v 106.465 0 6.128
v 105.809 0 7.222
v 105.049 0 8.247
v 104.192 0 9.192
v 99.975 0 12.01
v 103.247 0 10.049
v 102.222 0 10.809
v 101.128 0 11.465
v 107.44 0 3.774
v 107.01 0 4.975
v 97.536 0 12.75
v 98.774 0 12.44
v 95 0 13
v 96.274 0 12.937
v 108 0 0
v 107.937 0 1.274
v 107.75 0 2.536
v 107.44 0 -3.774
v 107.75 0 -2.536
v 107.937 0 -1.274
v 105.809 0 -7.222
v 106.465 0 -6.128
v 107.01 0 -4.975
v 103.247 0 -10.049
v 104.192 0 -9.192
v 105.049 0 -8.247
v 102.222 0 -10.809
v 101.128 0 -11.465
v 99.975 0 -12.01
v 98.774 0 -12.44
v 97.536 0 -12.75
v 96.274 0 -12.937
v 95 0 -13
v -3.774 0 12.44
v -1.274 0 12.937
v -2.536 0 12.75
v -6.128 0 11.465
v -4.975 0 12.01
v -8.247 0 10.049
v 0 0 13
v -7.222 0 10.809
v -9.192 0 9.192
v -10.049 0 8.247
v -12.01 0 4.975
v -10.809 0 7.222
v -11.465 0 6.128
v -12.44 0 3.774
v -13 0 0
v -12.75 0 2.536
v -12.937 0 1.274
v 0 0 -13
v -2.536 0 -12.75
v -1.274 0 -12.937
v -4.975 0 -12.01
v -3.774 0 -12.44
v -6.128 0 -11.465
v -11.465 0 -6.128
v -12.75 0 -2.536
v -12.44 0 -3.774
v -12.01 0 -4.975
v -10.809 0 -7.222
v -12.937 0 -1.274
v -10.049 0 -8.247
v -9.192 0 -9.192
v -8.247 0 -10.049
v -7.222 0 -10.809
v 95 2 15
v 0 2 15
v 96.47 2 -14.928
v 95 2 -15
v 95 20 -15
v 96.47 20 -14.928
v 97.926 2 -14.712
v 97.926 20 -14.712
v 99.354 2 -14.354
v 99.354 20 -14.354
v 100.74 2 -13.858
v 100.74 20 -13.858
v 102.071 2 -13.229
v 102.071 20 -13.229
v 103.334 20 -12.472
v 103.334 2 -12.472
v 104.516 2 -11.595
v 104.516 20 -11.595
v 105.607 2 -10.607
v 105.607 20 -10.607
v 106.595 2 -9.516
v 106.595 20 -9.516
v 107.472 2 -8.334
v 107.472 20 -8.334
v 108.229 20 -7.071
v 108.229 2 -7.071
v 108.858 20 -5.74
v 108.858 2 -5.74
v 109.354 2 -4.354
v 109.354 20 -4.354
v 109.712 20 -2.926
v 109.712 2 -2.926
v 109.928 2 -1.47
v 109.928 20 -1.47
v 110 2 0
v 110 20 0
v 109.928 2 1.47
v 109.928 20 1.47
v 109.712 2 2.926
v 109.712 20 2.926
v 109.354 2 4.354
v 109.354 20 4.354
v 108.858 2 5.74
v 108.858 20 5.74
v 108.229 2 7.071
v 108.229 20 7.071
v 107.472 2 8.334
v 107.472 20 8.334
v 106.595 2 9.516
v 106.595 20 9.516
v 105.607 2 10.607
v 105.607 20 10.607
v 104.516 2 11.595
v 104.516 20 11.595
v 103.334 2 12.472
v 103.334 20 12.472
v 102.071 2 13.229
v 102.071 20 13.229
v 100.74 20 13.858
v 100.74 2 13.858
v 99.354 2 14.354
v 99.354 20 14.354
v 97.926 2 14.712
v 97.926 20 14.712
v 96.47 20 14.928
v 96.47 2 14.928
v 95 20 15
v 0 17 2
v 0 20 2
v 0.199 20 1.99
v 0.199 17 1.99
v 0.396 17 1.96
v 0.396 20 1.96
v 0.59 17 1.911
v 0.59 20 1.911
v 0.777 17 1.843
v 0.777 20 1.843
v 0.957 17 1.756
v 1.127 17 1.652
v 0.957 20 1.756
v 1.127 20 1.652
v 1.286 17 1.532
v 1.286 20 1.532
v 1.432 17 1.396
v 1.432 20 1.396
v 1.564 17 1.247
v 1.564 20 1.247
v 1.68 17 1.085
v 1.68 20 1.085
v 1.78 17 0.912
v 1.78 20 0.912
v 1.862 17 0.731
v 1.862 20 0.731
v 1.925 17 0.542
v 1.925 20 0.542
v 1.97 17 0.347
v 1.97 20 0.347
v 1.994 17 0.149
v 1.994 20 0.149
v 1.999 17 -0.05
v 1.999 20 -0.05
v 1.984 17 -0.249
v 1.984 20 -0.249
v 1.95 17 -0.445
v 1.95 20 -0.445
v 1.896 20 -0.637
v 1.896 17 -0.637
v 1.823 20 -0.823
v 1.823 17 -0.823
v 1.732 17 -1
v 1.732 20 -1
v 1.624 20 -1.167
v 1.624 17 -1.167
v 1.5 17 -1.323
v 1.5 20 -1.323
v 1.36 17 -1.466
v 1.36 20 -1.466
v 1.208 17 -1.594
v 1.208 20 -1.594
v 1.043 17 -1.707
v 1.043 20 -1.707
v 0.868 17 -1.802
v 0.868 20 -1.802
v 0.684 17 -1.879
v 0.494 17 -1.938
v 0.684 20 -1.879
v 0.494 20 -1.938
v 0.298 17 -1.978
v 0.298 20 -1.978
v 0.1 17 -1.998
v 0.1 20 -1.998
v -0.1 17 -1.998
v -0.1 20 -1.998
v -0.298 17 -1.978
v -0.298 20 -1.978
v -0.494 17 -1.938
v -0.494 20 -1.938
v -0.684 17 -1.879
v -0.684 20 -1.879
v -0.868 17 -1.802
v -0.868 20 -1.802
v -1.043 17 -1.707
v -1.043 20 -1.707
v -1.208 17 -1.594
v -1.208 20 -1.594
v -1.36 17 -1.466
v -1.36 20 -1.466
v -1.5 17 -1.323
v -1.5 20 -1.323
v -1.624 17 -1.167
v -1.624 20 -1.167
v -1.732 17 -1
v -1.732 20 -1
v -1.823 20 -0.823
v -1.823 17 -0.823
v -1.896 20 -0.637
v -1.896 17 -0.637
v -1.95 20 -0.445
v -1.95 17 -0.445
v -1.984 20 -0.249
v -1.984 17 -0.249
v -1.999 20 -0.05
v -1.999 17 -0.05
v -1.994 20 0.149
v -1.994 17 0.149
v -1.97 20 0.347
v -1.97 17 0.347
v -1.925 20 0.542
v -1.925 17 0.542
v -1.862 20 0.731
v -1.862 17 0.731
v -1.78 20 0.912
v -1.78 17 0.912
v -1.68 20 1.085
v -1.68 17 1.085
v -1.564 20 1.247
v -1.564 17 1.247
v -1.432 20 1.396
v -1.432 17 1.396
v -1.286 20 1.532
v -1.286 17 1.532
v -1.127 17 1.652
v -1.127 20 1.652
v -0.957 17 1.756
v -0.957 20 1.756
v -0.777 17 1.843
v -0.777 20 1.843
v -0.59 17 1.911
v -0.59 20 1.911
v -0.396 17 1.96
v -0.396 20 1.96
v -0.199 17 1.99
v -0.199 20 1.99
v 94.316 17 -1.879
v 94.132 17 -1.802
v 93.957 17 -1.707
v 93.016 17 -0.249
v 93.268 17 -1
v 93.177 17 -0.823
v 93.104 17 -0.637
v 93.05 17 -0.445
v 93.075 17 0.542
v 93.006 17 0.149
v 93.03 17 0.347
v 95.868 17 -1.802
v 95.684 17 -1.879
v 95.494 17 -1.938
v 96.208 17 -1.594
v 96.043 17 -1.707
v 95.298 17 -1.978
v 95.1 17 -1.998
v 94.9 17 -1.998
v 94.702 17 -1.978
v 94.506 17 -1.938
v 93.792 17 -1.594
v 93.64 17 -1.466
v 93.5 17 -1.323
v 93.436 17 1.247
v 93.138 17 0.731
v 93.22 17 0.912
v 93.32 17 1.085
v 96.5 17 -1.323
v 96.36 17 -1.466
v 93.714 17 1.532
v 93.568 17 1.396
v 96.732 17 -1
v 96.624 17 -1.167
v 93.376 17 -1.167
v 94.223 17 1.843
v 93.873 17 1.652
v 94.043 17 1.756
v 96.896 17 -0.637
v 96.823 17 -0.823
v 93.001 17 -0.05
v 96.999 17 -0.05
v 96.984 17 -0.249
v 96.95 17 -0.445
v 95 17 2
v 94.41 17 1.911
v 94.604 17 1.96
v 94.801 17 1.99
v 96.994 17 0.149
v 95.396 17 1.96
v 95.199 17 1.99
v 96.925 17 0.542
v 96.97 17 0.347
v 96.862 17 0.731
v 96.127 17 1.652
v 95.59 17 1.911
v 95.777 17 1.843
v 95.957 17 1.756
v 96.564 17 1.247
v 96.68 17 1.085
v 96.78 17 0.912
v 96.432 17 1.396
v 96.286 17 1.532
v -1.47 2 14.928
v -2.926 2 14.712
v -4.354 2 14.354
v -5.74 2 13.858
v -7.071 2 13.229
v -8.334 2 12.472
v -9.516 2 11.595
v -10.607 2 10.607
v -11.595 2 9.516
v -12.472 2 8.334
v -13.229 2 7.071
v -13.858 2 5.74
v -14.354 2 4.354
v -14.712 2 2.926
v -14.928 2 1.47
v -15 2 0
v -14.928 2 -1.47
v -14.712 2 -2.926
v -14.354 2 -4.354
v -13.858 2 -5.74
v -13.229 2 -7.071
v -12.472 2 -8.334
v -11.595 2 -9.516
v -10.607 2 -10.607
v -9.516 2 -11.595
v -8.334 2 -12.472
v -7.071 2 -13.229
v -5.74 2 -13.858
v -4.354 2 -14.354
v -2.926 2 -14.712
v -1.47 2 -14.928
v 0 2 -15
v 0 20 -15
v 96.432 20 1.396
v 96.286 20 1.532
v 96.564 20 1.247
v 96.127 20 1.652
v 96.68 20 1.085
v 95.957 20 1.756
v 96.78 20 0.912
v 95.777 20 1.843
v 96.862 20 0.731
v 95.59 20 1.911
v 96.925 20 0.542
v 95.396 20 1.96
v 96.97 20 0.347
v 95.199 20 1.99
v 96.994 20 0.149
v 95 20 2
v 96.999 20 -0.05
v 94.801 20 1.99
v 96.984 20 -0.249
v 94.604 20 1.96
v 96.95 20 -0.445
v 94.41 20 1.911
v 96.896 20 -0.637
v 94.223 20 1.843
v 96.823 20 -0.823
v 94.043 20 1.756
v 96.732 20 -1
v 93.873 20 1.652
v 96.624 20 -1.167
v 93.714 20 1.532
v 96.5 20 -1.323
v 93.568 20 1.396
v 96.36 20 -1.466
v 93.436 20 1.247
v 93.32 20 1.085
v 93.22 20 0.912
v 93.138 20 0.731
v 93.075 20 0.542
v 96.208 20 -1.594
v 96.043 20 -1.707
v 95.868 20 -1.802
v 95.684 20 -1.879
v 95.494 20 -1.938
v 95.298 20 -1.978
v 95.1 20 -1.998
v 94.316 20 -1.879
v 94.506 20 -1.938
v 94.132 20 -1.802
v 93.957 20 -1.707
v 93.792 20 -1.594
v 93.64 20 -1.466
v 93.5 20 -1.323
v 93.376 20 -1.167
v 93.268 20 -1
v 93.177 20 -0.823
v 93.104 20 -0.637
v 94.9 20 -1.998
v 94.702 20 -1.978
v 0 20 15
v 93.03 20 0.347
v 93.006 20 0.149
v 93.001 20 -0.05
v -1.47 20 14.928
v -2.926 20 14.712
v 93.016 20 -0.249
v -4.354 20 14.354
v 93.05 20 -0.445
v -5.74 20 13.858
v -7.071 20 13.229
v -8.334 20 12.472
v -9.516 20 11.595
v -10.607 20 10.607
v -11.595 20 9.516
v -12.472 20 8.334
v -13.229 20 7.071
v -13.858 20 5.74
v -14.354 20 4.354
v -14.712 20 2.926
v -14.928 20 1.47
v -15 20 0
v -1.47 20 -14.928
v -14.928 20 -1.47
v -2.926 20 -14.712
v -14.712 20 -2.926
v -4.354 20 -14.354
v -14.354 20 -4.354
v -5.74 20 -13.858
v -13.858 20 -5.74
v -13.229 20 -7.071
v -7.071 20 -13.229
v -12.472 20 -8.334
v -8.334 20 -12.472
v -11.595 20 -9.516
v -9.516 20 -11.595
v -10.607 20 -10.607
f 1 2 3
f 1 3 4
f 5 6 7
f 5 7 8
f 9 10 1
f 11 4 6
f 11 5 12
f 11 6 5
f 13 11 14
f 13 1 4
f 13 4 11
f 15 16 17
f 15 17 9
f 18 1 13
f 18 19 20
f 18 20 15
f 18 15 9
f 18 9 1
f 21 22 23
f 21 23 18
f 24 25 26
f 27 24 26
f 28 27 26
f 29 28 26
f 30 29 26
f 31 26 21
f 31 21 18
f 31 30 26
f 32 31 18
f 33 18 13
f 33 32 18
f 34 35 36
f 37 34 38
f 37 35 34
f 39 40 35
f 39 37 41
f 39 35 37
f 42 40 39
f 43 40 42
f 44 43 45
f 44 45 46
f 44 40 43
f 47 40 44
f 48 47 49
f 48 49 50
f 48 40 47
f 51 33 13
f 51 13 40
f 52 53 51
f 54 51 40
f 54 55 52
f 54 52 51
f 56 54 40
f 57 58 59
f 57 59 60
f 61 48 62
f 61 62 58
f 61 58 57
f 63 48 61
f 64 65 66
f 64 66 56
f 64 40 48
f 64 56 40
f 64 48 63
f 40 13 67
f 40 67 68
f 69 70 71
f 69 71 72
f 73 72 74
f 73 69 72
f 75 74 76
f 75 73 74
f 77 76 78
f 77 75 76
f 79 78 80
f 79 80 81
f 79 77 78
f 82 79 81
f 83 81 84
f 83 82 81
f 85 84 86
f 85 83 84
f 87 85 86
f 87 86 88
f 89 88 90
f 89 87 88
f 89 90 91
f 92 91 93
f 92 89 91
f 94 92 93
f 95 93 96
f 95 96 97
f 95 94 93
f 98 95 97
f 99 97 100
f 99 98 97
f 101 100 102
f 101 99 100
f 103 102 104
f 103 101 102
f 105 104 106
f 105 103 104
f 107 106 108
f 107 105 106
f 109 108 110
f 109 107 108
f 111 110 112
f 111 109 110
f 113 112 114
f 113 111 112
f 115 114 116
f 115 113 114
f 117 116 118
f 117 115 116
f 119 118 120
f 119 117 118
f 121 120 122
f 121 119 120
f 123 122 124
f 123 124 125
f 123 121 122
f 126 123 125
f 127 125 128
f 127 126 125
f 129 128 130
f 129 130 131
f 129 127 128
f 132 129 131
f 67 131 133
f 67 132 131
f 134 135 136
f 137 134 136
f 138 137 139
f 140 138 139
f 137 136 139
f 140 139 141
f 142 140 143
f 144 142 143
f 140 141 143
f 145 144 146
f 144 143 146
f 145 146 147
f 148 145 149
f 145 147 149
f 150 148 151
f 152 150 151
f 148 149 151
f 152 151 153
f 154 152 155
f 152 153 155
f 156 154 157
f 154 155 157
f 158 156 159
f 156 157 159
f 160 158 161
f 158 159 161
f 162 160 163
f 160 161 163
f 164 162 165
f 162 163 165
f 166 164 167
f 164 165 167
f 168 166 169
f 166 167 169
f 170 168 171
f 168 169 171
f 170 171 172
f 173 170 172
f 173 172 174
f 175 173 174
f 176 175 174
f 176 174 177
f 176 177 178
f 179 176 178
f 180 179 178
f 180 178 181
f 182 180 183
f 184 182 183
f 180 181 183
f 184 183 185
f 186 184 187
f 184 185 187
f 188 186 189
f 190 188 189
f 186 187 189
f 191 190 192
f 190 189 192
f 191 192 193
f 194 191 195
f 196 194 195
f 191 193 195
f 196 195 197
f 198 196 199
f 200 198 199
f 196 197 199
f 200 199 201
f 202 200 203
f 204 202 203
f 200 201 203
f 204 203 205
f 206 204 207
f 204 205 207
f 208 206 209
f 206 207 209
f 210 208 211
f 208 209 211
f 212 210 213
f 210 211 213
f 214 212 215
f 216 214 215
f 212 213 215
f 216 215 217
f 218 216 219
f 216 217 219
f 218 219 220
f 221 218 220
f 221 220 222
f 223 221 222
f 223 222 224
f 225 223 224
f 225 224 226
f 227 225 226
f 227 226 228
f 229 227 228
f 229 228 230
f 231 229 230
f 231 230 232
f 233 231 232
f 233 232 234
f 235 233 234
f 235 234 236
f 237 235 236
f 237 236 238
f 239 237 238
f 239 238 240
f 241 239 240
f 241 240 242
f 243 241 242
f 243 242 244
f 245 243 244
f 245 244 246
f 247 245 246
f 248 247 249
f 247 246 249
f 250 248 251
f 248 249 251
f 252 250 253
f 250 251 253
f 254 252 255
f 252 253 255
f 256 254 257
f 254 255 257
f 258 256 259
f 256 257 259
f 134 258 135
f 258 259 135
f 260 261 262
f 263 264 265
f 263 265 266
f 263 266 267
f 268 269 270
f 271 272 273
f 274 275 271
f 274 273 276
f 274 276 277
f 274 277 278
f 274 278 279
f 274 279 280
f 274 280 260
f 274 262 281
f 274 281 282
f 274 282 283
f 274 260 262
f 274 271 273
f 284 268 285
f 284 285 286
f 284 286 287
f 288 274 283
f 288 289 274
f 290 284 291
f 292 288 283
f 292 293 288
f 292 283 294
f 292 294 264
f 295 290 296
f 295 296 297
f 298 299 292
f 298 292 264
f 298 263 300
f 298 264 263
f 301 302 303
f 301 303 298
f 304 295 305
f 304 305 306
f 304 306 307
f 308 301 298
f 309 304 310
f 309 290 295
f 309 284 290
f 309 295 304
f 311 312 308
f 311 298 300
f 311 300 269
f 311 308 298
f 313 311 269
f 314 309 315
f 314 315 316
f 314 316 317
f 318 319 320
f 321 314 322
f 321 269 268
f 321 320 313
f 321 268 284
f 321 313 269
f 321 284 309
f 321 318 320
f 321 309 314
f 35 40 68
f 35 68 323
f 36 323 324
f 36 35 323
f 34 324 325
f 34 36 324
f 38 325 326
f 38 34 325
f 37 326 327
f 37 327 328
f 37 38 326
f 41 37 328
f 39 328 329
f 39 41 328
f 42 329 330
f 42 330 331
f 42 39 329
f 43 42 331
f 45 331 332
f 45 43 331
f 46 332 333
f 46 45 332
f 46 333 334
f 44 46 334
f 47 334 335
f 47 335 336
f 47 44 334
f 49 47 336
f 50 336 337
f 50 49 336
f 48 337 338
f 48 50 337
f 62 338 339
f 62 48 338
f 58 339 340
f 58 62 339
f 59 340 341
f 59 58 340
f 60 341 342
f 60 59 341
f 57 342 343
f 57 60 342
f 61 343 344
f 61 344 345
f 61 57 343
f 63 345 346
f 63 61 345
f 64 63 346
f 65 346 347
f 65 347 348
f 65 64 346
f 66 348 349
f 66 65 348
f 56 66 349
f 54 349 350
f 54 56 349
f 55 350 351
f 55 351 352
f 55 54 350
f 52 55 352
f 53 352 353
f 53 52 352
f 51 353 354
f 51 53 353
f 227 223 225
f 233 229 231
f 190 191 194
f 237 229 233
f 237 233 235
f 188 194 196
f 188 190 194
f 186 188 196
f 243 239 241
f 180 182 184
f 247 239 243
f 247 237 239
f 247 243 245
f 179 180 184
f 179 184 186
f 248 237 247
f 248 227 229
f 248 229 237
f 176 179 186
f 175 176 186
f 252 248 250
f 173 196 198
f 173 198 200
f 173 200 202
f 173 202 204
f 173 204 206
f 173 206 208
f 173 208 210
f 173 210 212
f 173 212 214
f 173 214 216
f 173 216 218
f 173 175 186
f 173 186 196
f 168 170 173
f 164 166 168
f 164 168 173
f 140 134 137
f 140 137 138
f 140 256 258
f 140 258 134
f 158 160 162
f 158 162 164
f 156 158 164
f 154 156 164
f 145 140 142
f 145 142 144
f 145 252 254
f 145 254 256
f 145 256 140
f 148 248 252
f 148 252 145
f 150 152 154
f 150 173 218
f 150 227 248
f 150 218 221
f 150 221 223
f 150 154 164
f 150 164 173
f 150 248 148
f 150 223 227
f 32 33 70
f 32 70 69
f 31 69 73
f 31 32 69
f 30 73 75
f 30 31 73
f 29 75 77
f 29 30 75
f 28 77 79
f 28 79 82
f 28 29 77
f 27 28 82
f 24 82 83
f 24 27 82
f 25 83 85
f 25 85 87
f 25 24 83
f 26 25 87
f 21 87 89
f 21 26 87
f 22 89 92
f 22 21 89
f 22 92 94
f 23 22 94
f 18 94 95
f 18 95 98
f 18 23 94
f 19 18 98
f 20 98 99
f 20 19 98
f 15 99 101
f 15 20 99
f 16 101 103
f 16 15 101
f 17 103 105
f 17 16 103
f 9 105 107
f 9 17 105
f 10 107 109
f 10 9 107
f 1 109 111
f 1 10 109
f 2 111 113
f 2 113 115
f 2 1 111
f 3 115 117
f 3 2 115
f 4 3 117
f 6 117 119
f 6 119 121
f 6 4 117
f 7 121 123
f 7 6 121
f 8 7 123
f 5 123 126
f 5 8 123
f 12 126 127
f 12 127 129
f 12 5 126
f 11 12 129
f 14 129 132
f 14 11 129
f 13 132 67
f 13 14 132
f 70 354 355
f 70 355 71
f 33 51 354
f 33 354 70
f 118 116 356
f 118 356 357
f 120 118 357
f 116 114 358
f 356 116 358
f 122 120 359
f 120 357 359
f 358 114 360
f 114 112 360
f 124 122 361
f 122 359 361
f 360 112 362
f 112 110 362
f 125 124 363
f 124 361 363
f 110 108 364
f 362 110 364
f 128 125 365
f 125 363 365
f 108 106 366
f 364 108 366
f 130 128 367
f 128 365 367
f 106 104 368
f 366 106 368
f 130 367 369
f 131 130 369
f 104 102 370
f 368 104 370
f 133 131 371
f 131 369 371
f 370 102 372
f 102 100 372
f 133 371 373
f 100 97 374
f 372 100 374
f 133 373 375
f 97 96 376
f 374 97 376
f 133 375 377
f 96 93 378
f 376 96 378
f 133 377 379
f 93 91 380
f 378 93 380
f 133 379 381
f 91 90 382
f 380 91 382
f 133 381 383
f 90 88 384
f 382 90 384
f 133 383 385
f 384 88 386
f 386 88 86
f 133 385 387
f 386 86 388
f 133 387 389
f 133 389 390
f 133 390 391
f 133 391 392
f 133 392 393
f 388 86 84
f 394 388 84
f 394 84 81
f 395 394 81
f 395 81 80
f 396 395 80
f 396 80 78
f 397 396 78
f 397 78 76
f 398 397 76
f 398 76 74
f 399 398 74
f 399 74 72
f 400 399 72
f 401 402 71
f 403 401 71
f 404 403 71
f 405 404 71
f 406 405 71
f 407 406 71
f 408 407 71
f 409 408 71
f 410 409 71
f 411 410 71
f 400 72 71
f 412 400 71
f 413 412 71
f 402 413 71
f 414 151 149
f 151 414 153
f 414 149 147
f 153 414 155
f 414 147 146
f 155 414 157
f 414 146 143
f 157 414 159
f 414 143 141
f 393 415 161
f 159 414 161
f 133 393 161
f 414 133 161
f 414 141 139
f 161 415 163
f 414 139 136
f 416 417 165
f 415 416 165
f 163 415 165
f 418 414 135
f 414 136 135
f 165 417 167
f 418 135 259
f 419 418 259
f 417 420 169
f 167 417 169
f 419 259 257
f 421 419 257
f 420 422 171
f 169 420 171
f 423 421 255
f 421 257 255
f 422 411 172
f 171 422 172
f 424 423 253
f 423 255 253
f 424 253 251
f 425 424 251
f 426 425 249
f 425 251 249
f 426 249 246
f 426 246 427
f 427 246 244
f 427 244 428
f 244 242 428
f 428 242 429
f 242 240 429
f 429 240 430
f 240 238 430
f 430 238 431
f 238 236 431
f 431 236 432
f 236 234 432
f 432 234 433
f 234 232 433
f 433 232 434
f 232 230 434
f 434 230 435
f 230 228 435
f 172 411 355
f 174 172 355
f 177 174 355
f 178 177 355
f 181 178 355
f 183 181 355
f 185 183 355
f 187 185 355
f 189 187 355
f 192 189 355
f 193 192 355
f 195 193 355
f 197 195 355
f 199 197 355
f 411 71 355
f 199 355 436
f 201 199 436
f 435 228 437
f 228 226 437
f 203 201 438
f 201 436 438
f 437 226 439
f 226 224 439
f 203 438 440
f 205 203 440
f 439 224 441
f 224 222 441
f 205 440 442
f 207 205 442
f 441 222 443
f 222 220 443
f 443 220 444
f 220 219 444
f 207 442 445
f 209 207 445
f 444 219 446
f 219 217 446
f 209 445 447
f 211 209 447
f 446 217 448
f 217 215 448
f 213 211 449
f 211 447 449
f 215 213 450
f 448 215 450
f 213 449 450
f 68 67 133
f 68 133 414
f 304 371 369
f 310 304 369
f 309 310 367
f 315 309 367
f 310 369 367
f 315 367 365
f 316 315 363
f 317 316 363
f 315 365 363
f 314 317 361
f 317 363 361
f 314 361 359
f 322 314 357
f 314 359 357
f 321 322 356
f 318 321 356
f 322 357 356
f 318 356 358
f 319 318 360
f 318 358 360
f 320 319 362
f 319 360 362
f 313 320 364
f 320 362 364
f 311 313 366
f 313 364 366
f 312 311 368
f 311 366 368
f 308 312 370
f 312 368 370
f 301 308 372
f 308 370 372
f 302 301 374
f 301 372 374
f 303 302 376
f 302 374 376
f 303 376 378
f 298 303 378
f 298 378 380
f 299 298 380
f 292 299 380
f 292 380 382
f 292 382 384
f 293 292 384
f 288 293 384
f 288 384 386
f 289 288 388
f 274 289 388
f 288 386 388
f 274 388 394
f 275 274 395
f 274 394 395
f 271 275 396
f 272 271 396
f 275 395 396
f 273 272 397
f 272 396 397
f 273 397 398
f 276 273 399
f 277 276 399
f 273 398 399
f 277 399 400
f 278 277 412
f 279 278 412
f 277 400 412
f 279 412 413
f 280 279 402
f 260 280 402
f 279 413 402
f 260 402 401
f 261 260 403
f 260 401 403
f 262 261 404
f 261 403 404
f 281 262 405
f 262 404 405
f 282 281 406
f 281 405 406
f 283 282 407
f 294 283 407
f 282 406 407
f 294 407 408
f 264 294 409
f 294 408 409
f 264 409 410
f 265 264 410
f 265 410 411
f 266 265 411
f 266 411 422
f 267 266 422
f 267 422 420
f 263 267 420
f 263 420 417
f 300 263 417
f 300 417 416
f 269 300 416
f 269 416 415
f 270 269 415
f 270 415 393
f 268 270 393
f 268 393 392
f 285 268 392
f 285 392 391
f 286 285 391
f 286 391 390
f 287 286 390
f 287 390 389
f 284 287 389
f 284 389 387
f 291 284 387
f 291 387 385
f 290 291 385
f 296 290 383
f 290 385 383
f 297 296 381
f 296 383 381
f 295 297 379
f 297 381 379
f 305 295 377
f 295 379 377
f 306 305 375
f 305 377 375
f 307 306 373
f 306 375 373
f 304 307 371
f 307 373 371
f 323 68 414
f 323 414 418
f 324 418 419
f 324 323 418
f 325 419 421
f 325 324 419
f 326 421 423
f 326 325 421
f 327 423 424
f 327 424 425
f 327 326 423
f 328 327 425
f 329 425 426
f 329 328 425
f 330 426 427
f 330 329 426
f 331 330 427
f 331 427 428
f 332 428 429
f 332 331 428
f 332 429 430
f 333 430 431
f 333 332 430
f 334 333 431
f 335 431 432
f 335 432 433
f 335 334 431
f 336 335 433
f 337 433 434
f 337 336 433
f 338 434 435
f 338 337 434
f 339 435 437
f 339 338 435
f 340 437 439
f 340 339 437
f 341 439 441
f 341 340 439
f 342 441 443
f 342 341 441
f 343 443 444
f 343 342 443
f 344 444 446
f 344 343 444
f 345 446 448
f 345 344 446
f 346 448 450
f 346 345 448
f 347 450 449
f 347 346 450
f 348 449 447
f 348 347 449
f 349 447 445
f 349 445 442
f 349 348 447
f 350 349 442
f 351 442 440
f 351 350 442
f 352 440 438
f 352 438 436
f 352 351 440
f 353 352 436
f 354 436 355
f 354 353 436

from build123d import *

# Parameters (mm, degrees)
EXTRUDE_1_DEPTH     = 20
SKETCH_3_R          = 2
CUT_EXTRUDE_1_DEPTH = 3
CHAMFER_1_SIZE      = 2


with BuildPart() as part:
    # 草图1 → 凸台-拉伸1 (new body)
    with BuildSketch(Plane(origin=(0, 0, 0), x_dir=(1, 0, 0), z_dir=(0, 1, 0))):
        with BuildLine():
            Line((0, 15), (95, 15))
            ThreePointArc((95, 15), (110, 0), (95, -15))
            Line((95, -15), (0, -15))
            ThreePointArc((0, -15), (-15, 0), (0, 15))
        make_face()
    extrude(amount=EXTRUDE_1_DEPTH)

    # 草图3 → 切除-拉伸1 (cut)
    with BuildSketch(Plane(origin=(0, 20, 0), x_dir=(1, 0, 0), z_dir=(0, 1, 0))):
        with Locations(Location((0, 0, 0), (0, 0, 270))):
            Circle(SKETCH_3_R)
        with Locations(Location((95, 0, 0), (0, 0, 270))):
            Circle(SKETCH_3_R)
    extrude(amount=-CUT_EXTRUDE_1_DEPTH, mode=Mode.SUBTRACT)

    # 倒角1
    chamfer_1_edges = [part.edges().sort_by_distance(p)[0] for p in [
        (47.5, 0, -15),
        (110, 0, 0),
        (47.5, 0, 15),
        (-15, 0, 0),
    ]]
    chamfer(chamfer_1_edges, length=CHAMFER_1_SIZE)


solid = part.part
